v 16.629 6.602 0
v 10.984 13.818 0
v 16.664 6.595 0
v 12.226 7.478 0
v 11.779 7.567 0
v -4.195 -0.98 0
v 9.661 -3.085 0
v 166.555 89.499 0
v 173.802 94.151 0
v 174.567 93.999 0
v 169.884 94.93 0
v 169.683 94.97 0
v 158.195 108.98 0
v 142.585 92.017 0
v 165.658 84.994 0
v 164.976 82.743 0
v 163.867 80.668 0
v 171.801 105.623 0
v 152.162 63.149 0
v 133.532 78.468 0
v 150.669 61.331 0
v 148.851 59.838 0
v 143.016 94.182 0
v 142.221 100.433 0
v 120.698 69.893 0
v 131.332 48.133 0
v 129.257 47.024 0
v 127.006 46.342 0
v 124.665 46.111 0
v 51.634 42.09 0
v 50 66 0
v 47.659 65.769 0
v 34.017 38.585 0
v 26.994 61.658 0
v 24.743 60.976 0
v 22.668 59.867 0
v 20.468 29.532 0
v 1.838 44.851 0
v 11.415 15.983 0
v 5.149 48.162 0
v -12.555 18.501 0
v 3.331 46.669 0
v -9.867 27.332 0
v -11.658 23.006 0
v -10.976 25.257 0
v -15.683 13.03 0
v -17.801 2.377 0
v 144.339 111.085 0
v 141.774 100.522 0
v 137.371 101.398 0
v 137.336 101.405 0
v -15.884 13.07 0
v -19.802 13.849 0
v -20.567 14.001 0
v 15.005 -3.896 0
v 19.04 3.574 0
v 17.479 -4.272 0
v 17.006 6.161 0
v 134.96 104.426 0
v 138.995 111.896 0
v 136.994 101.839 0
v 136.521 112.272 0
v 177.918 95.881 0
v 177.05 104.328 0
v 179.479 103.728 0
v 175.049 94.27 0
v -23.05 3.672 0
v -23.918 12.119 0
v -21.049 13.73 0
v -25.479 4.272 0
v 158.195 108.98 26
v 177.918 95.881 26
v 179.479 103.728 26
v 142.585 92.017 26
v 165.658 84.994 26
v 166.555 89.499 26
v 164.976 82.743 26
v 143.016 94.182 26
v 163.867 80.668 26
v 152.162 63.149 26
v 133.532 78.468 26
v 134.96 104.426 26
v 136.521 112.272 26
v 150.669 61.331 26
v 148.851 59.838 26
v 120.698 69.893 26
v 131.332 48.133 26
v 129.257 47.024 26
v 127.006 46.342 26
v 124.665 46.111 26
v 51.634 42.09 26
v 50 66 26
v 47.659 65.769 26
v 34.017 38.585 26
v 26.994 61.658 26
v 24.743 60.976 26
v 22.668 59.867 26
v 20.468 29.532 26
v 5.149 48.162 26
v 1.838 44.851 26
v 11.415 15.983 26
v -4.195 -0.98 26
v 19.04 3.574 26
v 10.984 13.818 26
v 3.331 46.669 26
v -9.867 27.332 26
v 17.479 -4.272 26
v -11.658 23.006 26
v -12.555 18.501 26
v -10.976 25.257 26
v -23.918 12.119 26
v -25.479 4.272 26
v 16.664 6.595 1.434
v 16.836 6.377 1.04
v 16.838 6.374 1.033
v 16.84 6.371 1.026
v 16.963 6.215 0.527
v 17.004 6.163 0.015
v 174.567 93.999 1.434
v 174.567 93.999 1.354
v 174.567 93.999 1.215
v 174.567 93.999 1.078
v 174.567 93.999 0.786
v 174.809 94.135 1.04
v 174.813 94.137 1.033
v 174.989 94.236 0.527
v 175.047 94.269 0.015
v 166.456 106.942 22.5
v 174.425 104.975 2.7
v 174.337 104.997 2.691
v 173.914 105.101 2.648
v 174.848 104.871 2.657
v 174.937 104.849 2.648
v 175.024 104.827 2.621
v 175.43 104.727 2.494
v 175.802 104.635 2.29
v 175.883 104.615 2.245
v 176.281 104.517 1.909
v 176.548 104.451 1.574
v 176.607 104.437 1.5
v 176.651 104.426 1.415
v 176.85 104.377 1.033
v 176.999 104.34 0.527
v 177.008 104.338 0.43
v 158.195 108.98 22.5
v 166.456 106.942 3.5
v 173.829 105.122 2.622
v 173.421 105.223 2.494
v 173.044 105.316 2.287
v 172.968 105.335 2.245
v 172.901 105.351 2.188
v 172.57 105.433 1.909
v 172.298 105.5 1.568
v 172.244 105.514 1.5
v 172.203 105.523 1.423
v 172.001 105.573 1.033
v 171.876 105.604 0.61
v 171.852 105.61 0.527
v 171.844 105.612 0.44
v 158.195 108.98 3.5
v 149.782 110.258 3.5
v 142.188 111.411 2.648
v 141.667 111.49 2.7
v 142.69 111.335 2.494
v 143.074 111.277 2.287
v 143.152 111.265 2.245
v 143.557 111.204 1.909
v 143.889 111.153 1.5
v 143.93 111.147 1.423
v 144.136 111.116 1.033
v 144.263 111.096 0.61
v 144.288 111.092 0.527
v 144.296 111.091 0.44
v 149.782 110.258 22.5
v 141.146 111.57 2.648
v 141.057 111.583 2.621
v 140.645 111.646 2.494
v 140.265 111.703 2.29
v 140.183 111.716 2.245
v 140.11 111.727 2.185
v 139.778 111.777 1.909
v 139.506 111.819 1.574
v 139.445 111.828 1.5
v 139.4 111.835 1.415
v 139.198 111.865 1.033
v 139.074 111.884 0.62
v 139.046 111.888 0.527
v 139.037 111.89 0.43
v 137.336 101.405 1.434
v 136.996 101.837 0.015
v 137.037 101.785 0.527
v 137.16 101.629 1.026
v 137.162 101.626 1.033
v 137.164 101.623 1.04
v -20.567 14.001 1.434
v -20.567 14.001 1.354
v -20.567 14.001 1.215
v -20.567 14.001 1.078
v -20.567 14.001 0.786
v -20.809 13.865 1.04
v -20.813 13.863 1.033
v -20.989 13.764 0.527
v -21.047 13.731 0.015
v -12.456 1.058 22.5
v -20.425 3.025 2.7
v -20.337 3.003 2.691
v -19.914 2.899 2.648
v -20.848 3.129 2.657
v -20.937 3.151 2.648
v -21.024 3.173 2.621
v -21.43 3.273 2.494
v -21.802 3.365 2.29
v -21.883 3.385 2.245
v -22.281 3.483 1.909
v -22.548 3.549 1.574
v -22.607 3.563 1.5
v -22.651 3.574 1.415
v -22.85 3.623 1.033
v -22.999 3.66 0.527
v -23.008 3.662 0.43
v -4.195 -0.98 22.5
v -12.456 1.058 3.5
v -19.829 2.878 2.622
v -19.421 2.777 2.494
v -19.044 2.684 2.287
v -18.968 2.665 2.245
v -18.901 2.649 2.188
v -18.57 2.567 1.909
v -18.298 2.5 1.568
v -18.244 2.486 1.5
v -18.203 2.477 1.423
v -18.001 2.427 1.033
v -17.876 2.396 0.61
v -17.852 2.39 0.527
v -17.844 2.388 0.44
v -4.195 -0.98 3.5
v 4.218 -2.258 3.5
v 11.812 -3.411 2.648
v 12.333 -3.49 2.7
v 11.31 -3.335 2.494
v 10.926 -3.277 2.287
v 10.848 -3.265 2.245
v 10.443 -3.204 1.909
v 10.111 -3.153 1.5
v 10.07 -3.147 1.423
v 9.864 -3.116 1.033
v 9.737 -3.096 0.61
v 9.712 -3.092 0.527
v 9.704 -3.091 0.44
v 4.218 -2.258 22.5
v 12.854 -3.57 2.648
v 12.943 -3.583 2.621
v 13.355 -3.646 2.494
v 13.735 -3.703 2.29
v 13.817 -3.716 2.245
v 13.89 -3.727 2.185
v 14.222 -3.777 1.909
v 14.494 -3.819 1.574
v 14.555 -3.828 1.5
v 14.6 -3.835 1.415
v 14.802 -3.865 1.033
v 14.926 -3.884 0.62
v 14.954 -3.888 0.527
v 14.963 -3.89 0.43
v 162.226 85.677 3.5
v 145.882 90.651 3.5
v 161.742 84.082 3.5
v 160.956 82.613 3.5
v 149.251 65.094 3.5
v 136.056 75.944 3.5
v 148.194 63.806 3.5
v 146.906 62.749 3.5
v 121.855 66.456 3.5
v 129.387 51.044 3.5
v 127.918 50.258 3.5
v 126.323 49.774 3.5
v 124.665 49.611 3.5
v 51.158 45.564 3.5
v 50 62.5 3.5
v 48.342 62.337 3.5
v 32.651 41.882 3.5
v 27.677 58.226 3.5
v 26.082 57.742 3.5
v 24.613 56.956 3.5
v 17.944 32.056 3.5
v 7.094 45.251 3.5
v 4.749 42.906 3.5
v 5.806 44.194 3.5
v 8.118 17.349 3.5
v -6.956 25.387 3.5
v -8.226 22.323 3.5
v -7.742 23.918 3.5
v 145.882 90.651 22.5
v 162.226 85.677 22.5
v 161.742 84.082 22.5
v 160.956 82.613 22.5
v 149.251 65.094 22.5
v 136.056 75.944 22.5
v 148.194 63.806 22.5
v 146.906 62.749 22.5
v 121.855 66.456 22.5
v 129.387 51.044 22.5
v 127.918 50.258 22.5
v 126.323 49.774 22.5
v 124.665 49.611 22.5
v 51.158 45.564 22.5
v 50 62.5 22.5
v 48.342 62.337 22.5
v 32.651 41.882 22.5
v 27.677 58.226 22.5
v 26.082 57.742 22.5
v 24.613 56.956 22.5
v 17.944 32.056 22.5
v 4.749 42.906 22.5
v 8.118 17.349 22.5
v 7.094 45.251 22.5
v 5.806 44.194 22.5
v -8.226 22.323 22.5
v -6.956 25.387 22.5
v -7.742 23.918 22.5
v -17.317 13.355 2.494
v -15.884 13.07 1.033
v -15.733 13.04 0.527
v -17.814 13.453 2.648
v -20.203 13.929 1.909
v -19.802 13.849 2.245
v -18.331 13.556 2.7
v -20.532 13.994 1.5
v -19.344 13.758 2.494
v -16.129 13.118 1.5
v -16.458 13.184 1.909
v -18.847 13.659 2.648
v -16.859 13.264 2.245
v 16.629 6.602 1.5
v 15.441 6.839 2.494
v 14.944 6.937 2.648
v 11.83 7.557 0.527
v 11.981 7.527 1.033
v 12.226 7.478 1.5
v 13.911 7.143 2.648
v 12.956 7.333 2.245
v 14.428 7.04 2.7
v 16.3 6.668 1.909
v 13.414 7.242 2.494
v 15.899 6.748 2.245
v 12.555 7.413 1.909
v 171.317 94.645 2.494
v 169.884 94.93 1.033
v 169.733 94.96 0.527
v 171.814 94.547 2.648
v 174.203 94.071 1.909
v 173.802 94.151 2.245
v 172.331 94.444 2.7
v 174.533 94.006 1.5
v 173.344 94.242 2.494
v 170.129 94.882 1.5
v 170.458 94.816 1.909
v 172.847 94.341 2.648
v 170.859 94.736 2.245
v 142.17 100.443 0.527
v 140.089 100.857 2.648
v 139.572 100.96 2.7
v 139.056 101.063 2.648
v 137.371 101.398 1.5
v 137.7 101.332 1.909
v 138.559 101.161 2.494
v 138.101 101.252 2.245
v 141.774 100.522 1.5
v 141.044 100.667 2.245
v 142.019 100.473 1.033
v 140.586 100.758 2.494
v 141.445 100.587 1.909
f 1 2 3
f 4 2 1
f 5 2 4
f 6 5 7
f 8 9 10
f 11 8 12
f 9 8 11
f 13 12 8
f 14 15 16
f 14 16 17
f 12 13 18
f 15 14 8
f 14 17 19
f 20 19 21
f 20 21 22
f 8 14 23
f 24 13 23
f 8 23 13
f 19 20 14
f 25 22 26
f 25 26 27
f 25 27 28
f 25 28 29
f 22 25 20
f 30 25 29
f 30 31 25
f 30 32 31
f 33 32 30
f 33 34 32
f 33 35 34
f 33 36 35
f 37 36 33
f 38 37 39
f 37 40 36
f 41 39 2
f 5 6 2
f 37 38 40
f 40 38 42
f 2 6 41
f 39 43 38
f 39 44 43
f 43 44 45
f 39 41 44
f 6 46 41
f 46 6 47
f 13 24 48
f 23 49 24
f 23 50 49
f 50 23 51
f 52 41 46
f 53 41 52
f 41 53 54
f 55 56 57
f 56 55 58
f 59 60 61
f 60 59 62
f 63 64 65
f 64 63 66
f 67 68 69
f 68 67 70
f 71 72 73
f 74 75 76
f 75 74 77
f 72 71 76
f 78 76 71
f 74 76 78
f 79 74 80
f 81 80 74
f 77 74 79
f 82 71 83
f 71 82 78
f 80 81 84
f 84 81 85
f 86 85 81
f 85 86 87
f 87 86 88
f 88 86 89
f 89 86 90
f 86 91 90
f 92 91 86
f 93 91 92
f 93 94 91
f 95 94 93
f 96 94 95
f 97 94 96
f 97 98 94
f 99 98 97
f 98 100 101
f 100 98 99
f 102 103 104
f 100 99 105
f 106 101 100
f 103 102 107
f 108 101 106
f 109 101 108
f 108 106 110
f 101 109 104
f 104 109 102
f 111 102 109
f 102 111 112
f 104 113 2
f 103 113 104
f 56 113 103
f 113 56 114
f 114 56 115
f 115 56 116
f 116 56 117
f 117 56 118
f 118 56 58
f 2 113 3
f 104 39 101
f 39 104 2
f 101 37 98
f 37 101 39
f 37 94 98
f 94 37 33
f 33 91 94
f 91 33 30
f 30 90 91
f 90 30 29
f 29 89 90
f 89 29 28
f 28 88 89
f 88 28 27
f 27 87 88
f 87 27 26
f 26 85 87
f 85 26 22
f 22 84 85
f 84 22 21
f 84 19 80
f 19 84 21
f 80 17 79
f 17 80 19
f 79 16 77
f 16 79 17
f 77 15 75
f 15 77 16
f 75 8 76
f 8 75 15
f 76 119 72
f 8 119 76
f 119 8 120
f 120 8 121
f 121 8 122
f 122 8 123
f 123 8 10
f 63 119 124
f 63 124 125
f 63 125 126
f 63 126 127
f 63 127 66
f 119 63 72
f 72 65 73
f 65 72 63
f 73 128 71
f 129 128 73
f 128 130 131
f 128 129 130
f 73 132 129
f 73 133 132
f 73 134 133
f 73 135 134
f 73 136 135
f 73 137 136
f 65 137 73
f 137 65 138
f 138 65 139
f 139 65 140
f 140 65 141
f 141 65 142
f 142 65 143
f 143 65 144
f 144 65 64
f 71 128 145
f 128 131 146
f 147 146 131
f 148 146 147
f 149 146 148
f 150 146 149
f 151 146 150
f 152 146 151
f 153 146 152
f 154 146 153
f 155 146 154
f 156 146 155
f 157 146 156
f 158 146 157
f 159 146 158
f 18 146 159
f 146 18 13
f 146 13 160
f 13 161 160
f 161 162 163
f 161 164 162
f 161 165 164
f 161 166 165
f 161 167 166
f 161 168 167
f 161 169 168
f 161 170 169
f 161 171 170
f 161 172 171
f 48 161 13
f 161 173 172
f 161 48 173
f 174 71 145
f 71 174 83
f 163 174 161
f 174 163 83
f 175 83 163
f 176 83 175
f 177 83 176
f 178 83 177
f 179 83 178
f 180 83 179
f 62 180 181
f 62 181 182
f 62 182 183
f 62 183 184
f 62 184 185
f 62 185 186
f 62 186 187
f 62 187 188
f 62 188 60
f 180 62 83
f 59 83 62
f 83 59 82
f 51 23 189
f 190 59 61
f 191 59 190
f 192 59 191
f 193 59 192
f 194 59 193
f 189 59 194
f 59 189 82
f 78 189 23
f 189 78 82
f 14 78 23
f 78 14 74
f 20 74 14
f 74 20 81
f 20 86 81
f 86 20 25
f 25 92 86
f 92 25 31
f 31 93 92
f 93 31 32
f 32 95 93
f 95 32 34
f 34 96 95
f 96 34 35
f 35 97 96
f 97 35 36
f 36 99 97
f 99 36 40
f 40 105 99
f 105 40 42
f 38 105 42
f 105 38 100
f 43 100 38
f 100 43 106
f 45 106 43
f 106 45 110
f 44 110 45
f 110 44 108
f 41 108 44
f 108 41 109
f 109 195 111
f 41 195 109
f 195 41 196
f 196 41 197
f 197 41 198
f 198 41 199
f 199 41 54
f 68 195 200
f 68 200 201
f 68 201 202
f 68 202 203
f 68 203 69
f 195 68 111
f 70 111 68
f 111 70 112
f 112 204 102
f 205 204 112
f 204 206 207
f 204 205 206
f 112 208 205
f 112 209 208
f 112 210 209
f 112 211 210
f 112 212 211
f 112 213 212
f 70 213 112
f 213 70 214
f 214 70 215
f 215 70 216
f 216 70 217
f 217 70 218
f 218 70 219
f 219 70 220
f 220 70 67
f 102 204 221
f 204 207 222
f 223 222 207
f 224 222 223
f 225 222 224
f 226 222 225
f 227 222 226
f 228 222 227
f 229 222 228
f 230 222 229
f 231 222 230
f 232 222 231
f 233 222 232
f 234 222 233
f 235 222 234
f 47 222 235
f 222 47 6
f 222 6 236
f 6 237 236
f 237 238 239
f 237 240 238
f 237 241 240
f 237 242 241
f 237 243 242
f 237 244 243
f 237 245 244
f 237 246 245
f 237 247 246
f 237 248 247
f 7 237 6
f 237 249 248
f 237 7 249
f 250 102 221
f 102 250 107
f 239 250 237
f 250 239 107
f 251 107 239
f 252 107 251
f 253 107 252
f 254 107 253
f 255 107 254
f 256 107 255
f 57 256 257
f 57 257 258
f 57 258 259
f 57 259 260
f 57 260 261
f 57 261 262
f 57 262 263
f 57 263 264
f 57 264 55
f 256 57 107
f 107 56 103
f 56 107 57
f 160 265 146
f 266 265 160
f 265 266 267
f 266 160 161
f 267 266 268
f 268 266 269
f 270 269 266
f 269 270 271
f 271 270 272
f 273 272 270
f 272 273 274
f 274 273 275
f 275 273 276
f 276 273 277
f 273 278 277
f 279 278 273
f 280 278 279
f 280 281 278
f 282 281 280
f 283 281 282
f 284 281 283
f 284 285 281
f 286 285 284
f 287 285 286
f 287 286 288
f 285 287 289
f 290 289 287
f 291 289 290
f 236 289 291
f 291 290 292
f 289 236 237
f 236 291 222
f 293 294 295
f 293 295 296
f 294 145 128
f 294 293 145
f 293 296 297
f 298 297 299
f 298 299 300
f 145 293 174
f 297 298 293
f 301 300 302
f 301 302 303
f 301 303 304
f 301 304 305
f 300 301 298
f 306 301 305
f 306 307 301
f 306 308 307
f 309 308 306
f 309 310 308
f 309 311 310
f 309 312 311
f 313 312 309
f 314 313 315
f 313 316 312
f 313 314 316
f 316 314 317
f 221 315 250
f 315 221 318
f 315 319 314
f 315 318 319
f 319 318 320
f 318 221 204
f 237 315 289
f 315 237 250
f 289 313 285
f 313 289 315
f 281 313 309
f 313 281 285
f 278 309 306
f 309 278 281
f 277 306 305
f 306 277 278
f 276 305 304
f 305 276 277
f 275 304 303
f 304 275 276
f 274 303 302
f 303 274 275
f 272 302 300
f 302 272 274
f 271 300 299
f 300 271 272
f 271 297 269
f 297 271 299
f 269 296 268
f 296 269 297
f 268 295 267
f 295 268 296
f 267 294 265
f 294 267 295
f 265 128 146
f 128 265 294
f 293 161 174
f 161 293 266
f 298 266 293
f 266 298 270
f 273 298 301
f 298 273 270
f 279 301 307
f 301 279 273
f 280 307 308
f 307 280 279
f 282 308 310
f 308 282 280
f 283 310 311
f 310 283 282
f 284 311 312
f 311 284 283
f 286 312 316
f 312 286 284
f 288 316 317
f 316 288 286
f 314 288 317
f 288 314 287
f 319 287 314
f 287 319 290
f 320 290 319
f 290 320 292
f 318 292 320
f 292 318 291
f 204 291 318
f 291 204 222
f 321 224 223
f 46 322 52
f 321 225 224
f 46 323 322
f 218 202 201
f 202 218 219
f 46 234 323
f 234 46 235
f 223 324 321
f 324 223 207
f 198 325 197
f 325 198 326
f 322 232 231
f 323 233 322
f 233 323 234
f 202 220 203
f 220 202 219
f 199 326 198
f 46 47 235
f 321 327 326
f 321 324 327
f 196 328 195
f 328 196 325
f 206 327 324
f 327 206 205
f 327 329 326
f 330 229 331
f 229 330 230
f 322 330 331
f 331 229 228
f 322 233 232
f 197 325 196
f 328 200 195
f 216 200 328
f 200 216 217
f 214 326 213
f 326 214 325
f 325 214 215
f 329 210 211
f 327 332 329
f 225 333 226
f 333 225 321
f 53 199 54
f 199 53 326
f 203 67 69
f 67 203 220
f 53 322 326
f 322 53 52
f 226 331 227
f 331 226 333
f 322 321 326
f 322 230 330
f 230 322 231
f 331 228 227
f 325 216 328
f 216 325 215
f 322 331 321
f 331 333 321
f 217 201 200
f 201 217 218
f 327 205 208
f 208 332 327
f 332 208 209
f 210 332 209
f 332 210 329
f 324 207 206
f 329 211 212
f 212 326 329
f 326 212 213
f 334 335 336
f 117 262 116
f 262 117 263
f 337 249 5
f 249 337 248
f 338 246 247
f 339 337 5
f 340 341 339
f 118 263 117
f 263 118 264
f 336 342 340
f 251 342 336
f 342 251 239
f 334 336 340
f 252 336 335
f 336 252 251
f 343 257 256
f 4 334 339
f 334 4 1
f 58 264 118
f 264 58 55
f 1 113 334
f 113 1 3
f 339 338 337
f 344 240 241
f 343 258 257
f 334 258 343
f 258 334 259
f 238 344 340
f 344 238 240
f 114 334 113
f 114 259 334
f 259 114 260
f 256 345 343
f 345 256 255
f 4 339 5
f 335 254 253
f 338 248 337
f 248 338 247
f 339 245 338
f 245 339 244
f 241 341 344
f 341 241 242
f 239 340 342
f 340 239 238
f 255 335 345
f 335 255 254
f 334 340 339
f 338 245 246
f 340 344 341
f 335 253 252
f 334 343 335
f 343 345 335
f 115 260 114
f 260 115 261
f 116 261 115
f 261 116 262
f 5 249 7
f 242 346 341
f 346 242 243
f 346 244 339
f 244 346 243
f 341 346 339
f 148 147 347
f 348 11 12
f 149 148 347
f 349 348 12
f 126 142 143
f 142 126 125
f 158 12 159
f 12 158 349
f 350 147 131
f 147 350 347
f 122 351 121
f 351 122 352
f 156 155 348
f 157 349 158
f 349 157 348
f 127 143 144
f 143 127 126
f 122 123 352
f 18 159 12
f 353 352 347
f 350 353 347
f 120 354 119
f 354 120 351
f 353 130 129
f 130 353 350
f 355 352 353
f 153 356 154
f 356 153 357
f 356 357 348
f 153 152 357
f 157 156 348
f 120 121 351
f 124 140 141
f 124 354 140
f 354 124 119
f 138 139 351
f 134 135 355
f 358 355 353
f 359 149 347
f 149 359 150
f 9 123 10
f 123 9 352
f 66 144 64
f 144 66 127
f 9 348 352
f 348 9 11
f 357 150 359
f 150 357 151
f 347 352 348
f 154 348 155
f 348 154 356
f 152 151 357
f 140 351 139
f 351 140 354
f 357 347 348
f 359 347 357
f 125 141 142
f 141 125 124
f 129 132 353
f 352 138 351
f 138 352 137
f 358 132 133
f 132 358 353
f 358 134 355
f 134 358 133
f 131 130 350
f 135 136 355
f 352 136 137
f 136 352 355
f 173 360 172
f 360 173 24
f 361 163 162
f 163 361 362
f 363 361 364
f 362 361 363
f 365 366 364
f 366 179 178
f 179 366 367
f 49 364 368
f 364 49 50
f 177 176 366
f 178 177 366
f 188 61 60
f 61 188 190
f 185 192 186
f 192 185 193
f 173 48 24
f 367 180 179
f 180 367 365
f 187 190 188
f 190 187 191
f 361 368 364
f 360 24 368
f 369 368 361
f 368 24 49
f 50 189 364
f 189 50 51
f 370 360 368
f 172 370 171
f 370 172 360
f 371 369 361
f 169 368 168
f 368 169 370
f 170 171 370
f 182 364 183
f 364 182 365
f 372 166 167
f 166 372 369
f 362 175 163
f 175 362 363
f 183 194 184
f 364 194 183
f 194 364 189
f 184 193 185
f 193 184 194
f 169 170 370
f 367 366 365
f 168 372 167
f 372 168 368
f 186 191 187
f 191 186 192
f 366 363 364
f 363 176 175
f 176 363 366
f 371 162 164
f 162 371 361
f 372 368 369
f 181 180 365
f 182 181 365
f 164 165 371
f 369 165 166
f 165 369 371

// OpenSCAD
$fn = 32;

// ----------------------------------------------------------------------
// Air duct: 24 mm duct, 3.5 mm wall, 26 mm across
// ----------------------------------------------------------------------

// --- parameters (mm) ---
duct_r = 12;              // duct core radius
duct_d = 24;              // duct core diameter
wall = 3.5;               // duct wall thickness
height = 26;              // duct width (extrusion height)
port_r = 21.9;            // port flange half width
port_d = 43.8;            // port flange width
port_t = 8;               // port flange thickness
bolt_d = 5.4;             // port bolt holes
bolt_offset = 16.7;       // bolt hole offset from the port axis

difference() {
  /* outer hull chain: tube with a flat flange plate at every port */
  linear_extrude(height = 26) {
    hull() {
      polygon([[17.479, -4.272], [-25.479, 4.272], [-23.918, 12.119], [19.04, 3.574]]);
      translate([-1.854, 10.789]) circle(r = 12);
    }
    hull() {
      translate([-1.854, 10.789]) circle(r = 12);
      translate([0.111, 20.665]) circle(r = 12);
    }
    hull() {
      translate([0.111, 20.665]) circle(r = 12);
      translate([11.816, 38.184]) circle(r = 12);
    }
    hull() {
      translate([11.816, 38.184]) circle(r = 12);
      translate([29.335, 49.889]) circle(r = 12);
    }
    hull() {
      translate([29.335, 49.889]) circle(r = 12);
      translate([50, 54]) circle(r = 12);
    }
    hull() {
      translate([50, 54]) circle(r = 12);
      translate([124.665, 58.111]) circle(r = 12);
    }
    hull() {
      translate([124.665, 58.111]) circle(r = 12);
      translate([142.184, 69.816]) circle(r = 12);
    }
    hull() {
      translate([142.184, 69.816]) circle(r = 12);
      translate([153.889, 87.335]) circle(r = 12);
    }
    hull() {
      translate([153.889, 87.335]) circle(r = 12);
      translate([155.854, 97.211]) circle(r = 12);
    }
    hull() {
      translate([155.854, 97.211]) circle(r = 12);
      polygon([[136.521, 112.272], [179.479, 103.728], [177.918, 95.881], [134.96, 104.426]]);
    }
  }
  /* air passage: the same chain inset by the wall, 5 mm proud of the ports */
  translate([0, 0, 3.5]) linear_extrude(height = 19) {
    hull() {
      translate([-4.975, -4.904]) circle(r = 8.5);
      translate([0.111, 20.665]) circle(r = 8.5);
    }
    hull() {
      translate([0.111, 20.665]) circle(r = 8.5);
      translate([11.816, 38.184]) circle(r = 8.5);
    }
    hull() {
      translate([11.816, 38.184]) circle(r = 8.5);
      translate([29.335, 49.889]) circle(r = 8.5);
    }
    hull() {
      translate([29.335, 49.889]) circle(r = 8.5);
      translate([50, 54]) circle(r = 8.5);
    }
    hull() {
      translate([50, 54]) circle(r = 8.5);
      translate([124.665, 58.111]) circle(r = 8.5);
    }
    hull() {
      translate([124.665, 58.111]) circle(r = 8.5);
      translate([142.184, 69.816]) circle(r = 8.5);
    }
    hull() {
      translate([142.184, 69.816]) circle(r = 8.5);
      translate([153.889, 87.335]) circle(r = 8.5);
    }
    hull() {
      translate([153.889, 87.335]) circle(r = 8.5);
      translate([158.975, 112.904]) circle(r = 8.5);
    }
  }
  translate([-4, 0]) rotate([0, 0, -11.25]) translate([-16.7, -2.5]) rotate([-90, 0, 0]) cylinder(h = 13, d = 5.4);
  translate([-4, 0]) rotate([0, 0, -11.25]) translate([16.7, -2.5]) rotate([-90, 0, 0]) cylinder(h = 13, d = 5.4);
  translate([158, 108]) rotate([0, 0, 168.75]) translate([-16.7, -2.5]) rotate([-90, 0, 0]) cylinder(h = 13, d = 5.4);
  translate([158, 108]) rotate([0, 0, 168.75]) translate([16.7, -2.5]) rotate([-90, 0, 0]) cylinder(h = 13, d = 5.4);
}
